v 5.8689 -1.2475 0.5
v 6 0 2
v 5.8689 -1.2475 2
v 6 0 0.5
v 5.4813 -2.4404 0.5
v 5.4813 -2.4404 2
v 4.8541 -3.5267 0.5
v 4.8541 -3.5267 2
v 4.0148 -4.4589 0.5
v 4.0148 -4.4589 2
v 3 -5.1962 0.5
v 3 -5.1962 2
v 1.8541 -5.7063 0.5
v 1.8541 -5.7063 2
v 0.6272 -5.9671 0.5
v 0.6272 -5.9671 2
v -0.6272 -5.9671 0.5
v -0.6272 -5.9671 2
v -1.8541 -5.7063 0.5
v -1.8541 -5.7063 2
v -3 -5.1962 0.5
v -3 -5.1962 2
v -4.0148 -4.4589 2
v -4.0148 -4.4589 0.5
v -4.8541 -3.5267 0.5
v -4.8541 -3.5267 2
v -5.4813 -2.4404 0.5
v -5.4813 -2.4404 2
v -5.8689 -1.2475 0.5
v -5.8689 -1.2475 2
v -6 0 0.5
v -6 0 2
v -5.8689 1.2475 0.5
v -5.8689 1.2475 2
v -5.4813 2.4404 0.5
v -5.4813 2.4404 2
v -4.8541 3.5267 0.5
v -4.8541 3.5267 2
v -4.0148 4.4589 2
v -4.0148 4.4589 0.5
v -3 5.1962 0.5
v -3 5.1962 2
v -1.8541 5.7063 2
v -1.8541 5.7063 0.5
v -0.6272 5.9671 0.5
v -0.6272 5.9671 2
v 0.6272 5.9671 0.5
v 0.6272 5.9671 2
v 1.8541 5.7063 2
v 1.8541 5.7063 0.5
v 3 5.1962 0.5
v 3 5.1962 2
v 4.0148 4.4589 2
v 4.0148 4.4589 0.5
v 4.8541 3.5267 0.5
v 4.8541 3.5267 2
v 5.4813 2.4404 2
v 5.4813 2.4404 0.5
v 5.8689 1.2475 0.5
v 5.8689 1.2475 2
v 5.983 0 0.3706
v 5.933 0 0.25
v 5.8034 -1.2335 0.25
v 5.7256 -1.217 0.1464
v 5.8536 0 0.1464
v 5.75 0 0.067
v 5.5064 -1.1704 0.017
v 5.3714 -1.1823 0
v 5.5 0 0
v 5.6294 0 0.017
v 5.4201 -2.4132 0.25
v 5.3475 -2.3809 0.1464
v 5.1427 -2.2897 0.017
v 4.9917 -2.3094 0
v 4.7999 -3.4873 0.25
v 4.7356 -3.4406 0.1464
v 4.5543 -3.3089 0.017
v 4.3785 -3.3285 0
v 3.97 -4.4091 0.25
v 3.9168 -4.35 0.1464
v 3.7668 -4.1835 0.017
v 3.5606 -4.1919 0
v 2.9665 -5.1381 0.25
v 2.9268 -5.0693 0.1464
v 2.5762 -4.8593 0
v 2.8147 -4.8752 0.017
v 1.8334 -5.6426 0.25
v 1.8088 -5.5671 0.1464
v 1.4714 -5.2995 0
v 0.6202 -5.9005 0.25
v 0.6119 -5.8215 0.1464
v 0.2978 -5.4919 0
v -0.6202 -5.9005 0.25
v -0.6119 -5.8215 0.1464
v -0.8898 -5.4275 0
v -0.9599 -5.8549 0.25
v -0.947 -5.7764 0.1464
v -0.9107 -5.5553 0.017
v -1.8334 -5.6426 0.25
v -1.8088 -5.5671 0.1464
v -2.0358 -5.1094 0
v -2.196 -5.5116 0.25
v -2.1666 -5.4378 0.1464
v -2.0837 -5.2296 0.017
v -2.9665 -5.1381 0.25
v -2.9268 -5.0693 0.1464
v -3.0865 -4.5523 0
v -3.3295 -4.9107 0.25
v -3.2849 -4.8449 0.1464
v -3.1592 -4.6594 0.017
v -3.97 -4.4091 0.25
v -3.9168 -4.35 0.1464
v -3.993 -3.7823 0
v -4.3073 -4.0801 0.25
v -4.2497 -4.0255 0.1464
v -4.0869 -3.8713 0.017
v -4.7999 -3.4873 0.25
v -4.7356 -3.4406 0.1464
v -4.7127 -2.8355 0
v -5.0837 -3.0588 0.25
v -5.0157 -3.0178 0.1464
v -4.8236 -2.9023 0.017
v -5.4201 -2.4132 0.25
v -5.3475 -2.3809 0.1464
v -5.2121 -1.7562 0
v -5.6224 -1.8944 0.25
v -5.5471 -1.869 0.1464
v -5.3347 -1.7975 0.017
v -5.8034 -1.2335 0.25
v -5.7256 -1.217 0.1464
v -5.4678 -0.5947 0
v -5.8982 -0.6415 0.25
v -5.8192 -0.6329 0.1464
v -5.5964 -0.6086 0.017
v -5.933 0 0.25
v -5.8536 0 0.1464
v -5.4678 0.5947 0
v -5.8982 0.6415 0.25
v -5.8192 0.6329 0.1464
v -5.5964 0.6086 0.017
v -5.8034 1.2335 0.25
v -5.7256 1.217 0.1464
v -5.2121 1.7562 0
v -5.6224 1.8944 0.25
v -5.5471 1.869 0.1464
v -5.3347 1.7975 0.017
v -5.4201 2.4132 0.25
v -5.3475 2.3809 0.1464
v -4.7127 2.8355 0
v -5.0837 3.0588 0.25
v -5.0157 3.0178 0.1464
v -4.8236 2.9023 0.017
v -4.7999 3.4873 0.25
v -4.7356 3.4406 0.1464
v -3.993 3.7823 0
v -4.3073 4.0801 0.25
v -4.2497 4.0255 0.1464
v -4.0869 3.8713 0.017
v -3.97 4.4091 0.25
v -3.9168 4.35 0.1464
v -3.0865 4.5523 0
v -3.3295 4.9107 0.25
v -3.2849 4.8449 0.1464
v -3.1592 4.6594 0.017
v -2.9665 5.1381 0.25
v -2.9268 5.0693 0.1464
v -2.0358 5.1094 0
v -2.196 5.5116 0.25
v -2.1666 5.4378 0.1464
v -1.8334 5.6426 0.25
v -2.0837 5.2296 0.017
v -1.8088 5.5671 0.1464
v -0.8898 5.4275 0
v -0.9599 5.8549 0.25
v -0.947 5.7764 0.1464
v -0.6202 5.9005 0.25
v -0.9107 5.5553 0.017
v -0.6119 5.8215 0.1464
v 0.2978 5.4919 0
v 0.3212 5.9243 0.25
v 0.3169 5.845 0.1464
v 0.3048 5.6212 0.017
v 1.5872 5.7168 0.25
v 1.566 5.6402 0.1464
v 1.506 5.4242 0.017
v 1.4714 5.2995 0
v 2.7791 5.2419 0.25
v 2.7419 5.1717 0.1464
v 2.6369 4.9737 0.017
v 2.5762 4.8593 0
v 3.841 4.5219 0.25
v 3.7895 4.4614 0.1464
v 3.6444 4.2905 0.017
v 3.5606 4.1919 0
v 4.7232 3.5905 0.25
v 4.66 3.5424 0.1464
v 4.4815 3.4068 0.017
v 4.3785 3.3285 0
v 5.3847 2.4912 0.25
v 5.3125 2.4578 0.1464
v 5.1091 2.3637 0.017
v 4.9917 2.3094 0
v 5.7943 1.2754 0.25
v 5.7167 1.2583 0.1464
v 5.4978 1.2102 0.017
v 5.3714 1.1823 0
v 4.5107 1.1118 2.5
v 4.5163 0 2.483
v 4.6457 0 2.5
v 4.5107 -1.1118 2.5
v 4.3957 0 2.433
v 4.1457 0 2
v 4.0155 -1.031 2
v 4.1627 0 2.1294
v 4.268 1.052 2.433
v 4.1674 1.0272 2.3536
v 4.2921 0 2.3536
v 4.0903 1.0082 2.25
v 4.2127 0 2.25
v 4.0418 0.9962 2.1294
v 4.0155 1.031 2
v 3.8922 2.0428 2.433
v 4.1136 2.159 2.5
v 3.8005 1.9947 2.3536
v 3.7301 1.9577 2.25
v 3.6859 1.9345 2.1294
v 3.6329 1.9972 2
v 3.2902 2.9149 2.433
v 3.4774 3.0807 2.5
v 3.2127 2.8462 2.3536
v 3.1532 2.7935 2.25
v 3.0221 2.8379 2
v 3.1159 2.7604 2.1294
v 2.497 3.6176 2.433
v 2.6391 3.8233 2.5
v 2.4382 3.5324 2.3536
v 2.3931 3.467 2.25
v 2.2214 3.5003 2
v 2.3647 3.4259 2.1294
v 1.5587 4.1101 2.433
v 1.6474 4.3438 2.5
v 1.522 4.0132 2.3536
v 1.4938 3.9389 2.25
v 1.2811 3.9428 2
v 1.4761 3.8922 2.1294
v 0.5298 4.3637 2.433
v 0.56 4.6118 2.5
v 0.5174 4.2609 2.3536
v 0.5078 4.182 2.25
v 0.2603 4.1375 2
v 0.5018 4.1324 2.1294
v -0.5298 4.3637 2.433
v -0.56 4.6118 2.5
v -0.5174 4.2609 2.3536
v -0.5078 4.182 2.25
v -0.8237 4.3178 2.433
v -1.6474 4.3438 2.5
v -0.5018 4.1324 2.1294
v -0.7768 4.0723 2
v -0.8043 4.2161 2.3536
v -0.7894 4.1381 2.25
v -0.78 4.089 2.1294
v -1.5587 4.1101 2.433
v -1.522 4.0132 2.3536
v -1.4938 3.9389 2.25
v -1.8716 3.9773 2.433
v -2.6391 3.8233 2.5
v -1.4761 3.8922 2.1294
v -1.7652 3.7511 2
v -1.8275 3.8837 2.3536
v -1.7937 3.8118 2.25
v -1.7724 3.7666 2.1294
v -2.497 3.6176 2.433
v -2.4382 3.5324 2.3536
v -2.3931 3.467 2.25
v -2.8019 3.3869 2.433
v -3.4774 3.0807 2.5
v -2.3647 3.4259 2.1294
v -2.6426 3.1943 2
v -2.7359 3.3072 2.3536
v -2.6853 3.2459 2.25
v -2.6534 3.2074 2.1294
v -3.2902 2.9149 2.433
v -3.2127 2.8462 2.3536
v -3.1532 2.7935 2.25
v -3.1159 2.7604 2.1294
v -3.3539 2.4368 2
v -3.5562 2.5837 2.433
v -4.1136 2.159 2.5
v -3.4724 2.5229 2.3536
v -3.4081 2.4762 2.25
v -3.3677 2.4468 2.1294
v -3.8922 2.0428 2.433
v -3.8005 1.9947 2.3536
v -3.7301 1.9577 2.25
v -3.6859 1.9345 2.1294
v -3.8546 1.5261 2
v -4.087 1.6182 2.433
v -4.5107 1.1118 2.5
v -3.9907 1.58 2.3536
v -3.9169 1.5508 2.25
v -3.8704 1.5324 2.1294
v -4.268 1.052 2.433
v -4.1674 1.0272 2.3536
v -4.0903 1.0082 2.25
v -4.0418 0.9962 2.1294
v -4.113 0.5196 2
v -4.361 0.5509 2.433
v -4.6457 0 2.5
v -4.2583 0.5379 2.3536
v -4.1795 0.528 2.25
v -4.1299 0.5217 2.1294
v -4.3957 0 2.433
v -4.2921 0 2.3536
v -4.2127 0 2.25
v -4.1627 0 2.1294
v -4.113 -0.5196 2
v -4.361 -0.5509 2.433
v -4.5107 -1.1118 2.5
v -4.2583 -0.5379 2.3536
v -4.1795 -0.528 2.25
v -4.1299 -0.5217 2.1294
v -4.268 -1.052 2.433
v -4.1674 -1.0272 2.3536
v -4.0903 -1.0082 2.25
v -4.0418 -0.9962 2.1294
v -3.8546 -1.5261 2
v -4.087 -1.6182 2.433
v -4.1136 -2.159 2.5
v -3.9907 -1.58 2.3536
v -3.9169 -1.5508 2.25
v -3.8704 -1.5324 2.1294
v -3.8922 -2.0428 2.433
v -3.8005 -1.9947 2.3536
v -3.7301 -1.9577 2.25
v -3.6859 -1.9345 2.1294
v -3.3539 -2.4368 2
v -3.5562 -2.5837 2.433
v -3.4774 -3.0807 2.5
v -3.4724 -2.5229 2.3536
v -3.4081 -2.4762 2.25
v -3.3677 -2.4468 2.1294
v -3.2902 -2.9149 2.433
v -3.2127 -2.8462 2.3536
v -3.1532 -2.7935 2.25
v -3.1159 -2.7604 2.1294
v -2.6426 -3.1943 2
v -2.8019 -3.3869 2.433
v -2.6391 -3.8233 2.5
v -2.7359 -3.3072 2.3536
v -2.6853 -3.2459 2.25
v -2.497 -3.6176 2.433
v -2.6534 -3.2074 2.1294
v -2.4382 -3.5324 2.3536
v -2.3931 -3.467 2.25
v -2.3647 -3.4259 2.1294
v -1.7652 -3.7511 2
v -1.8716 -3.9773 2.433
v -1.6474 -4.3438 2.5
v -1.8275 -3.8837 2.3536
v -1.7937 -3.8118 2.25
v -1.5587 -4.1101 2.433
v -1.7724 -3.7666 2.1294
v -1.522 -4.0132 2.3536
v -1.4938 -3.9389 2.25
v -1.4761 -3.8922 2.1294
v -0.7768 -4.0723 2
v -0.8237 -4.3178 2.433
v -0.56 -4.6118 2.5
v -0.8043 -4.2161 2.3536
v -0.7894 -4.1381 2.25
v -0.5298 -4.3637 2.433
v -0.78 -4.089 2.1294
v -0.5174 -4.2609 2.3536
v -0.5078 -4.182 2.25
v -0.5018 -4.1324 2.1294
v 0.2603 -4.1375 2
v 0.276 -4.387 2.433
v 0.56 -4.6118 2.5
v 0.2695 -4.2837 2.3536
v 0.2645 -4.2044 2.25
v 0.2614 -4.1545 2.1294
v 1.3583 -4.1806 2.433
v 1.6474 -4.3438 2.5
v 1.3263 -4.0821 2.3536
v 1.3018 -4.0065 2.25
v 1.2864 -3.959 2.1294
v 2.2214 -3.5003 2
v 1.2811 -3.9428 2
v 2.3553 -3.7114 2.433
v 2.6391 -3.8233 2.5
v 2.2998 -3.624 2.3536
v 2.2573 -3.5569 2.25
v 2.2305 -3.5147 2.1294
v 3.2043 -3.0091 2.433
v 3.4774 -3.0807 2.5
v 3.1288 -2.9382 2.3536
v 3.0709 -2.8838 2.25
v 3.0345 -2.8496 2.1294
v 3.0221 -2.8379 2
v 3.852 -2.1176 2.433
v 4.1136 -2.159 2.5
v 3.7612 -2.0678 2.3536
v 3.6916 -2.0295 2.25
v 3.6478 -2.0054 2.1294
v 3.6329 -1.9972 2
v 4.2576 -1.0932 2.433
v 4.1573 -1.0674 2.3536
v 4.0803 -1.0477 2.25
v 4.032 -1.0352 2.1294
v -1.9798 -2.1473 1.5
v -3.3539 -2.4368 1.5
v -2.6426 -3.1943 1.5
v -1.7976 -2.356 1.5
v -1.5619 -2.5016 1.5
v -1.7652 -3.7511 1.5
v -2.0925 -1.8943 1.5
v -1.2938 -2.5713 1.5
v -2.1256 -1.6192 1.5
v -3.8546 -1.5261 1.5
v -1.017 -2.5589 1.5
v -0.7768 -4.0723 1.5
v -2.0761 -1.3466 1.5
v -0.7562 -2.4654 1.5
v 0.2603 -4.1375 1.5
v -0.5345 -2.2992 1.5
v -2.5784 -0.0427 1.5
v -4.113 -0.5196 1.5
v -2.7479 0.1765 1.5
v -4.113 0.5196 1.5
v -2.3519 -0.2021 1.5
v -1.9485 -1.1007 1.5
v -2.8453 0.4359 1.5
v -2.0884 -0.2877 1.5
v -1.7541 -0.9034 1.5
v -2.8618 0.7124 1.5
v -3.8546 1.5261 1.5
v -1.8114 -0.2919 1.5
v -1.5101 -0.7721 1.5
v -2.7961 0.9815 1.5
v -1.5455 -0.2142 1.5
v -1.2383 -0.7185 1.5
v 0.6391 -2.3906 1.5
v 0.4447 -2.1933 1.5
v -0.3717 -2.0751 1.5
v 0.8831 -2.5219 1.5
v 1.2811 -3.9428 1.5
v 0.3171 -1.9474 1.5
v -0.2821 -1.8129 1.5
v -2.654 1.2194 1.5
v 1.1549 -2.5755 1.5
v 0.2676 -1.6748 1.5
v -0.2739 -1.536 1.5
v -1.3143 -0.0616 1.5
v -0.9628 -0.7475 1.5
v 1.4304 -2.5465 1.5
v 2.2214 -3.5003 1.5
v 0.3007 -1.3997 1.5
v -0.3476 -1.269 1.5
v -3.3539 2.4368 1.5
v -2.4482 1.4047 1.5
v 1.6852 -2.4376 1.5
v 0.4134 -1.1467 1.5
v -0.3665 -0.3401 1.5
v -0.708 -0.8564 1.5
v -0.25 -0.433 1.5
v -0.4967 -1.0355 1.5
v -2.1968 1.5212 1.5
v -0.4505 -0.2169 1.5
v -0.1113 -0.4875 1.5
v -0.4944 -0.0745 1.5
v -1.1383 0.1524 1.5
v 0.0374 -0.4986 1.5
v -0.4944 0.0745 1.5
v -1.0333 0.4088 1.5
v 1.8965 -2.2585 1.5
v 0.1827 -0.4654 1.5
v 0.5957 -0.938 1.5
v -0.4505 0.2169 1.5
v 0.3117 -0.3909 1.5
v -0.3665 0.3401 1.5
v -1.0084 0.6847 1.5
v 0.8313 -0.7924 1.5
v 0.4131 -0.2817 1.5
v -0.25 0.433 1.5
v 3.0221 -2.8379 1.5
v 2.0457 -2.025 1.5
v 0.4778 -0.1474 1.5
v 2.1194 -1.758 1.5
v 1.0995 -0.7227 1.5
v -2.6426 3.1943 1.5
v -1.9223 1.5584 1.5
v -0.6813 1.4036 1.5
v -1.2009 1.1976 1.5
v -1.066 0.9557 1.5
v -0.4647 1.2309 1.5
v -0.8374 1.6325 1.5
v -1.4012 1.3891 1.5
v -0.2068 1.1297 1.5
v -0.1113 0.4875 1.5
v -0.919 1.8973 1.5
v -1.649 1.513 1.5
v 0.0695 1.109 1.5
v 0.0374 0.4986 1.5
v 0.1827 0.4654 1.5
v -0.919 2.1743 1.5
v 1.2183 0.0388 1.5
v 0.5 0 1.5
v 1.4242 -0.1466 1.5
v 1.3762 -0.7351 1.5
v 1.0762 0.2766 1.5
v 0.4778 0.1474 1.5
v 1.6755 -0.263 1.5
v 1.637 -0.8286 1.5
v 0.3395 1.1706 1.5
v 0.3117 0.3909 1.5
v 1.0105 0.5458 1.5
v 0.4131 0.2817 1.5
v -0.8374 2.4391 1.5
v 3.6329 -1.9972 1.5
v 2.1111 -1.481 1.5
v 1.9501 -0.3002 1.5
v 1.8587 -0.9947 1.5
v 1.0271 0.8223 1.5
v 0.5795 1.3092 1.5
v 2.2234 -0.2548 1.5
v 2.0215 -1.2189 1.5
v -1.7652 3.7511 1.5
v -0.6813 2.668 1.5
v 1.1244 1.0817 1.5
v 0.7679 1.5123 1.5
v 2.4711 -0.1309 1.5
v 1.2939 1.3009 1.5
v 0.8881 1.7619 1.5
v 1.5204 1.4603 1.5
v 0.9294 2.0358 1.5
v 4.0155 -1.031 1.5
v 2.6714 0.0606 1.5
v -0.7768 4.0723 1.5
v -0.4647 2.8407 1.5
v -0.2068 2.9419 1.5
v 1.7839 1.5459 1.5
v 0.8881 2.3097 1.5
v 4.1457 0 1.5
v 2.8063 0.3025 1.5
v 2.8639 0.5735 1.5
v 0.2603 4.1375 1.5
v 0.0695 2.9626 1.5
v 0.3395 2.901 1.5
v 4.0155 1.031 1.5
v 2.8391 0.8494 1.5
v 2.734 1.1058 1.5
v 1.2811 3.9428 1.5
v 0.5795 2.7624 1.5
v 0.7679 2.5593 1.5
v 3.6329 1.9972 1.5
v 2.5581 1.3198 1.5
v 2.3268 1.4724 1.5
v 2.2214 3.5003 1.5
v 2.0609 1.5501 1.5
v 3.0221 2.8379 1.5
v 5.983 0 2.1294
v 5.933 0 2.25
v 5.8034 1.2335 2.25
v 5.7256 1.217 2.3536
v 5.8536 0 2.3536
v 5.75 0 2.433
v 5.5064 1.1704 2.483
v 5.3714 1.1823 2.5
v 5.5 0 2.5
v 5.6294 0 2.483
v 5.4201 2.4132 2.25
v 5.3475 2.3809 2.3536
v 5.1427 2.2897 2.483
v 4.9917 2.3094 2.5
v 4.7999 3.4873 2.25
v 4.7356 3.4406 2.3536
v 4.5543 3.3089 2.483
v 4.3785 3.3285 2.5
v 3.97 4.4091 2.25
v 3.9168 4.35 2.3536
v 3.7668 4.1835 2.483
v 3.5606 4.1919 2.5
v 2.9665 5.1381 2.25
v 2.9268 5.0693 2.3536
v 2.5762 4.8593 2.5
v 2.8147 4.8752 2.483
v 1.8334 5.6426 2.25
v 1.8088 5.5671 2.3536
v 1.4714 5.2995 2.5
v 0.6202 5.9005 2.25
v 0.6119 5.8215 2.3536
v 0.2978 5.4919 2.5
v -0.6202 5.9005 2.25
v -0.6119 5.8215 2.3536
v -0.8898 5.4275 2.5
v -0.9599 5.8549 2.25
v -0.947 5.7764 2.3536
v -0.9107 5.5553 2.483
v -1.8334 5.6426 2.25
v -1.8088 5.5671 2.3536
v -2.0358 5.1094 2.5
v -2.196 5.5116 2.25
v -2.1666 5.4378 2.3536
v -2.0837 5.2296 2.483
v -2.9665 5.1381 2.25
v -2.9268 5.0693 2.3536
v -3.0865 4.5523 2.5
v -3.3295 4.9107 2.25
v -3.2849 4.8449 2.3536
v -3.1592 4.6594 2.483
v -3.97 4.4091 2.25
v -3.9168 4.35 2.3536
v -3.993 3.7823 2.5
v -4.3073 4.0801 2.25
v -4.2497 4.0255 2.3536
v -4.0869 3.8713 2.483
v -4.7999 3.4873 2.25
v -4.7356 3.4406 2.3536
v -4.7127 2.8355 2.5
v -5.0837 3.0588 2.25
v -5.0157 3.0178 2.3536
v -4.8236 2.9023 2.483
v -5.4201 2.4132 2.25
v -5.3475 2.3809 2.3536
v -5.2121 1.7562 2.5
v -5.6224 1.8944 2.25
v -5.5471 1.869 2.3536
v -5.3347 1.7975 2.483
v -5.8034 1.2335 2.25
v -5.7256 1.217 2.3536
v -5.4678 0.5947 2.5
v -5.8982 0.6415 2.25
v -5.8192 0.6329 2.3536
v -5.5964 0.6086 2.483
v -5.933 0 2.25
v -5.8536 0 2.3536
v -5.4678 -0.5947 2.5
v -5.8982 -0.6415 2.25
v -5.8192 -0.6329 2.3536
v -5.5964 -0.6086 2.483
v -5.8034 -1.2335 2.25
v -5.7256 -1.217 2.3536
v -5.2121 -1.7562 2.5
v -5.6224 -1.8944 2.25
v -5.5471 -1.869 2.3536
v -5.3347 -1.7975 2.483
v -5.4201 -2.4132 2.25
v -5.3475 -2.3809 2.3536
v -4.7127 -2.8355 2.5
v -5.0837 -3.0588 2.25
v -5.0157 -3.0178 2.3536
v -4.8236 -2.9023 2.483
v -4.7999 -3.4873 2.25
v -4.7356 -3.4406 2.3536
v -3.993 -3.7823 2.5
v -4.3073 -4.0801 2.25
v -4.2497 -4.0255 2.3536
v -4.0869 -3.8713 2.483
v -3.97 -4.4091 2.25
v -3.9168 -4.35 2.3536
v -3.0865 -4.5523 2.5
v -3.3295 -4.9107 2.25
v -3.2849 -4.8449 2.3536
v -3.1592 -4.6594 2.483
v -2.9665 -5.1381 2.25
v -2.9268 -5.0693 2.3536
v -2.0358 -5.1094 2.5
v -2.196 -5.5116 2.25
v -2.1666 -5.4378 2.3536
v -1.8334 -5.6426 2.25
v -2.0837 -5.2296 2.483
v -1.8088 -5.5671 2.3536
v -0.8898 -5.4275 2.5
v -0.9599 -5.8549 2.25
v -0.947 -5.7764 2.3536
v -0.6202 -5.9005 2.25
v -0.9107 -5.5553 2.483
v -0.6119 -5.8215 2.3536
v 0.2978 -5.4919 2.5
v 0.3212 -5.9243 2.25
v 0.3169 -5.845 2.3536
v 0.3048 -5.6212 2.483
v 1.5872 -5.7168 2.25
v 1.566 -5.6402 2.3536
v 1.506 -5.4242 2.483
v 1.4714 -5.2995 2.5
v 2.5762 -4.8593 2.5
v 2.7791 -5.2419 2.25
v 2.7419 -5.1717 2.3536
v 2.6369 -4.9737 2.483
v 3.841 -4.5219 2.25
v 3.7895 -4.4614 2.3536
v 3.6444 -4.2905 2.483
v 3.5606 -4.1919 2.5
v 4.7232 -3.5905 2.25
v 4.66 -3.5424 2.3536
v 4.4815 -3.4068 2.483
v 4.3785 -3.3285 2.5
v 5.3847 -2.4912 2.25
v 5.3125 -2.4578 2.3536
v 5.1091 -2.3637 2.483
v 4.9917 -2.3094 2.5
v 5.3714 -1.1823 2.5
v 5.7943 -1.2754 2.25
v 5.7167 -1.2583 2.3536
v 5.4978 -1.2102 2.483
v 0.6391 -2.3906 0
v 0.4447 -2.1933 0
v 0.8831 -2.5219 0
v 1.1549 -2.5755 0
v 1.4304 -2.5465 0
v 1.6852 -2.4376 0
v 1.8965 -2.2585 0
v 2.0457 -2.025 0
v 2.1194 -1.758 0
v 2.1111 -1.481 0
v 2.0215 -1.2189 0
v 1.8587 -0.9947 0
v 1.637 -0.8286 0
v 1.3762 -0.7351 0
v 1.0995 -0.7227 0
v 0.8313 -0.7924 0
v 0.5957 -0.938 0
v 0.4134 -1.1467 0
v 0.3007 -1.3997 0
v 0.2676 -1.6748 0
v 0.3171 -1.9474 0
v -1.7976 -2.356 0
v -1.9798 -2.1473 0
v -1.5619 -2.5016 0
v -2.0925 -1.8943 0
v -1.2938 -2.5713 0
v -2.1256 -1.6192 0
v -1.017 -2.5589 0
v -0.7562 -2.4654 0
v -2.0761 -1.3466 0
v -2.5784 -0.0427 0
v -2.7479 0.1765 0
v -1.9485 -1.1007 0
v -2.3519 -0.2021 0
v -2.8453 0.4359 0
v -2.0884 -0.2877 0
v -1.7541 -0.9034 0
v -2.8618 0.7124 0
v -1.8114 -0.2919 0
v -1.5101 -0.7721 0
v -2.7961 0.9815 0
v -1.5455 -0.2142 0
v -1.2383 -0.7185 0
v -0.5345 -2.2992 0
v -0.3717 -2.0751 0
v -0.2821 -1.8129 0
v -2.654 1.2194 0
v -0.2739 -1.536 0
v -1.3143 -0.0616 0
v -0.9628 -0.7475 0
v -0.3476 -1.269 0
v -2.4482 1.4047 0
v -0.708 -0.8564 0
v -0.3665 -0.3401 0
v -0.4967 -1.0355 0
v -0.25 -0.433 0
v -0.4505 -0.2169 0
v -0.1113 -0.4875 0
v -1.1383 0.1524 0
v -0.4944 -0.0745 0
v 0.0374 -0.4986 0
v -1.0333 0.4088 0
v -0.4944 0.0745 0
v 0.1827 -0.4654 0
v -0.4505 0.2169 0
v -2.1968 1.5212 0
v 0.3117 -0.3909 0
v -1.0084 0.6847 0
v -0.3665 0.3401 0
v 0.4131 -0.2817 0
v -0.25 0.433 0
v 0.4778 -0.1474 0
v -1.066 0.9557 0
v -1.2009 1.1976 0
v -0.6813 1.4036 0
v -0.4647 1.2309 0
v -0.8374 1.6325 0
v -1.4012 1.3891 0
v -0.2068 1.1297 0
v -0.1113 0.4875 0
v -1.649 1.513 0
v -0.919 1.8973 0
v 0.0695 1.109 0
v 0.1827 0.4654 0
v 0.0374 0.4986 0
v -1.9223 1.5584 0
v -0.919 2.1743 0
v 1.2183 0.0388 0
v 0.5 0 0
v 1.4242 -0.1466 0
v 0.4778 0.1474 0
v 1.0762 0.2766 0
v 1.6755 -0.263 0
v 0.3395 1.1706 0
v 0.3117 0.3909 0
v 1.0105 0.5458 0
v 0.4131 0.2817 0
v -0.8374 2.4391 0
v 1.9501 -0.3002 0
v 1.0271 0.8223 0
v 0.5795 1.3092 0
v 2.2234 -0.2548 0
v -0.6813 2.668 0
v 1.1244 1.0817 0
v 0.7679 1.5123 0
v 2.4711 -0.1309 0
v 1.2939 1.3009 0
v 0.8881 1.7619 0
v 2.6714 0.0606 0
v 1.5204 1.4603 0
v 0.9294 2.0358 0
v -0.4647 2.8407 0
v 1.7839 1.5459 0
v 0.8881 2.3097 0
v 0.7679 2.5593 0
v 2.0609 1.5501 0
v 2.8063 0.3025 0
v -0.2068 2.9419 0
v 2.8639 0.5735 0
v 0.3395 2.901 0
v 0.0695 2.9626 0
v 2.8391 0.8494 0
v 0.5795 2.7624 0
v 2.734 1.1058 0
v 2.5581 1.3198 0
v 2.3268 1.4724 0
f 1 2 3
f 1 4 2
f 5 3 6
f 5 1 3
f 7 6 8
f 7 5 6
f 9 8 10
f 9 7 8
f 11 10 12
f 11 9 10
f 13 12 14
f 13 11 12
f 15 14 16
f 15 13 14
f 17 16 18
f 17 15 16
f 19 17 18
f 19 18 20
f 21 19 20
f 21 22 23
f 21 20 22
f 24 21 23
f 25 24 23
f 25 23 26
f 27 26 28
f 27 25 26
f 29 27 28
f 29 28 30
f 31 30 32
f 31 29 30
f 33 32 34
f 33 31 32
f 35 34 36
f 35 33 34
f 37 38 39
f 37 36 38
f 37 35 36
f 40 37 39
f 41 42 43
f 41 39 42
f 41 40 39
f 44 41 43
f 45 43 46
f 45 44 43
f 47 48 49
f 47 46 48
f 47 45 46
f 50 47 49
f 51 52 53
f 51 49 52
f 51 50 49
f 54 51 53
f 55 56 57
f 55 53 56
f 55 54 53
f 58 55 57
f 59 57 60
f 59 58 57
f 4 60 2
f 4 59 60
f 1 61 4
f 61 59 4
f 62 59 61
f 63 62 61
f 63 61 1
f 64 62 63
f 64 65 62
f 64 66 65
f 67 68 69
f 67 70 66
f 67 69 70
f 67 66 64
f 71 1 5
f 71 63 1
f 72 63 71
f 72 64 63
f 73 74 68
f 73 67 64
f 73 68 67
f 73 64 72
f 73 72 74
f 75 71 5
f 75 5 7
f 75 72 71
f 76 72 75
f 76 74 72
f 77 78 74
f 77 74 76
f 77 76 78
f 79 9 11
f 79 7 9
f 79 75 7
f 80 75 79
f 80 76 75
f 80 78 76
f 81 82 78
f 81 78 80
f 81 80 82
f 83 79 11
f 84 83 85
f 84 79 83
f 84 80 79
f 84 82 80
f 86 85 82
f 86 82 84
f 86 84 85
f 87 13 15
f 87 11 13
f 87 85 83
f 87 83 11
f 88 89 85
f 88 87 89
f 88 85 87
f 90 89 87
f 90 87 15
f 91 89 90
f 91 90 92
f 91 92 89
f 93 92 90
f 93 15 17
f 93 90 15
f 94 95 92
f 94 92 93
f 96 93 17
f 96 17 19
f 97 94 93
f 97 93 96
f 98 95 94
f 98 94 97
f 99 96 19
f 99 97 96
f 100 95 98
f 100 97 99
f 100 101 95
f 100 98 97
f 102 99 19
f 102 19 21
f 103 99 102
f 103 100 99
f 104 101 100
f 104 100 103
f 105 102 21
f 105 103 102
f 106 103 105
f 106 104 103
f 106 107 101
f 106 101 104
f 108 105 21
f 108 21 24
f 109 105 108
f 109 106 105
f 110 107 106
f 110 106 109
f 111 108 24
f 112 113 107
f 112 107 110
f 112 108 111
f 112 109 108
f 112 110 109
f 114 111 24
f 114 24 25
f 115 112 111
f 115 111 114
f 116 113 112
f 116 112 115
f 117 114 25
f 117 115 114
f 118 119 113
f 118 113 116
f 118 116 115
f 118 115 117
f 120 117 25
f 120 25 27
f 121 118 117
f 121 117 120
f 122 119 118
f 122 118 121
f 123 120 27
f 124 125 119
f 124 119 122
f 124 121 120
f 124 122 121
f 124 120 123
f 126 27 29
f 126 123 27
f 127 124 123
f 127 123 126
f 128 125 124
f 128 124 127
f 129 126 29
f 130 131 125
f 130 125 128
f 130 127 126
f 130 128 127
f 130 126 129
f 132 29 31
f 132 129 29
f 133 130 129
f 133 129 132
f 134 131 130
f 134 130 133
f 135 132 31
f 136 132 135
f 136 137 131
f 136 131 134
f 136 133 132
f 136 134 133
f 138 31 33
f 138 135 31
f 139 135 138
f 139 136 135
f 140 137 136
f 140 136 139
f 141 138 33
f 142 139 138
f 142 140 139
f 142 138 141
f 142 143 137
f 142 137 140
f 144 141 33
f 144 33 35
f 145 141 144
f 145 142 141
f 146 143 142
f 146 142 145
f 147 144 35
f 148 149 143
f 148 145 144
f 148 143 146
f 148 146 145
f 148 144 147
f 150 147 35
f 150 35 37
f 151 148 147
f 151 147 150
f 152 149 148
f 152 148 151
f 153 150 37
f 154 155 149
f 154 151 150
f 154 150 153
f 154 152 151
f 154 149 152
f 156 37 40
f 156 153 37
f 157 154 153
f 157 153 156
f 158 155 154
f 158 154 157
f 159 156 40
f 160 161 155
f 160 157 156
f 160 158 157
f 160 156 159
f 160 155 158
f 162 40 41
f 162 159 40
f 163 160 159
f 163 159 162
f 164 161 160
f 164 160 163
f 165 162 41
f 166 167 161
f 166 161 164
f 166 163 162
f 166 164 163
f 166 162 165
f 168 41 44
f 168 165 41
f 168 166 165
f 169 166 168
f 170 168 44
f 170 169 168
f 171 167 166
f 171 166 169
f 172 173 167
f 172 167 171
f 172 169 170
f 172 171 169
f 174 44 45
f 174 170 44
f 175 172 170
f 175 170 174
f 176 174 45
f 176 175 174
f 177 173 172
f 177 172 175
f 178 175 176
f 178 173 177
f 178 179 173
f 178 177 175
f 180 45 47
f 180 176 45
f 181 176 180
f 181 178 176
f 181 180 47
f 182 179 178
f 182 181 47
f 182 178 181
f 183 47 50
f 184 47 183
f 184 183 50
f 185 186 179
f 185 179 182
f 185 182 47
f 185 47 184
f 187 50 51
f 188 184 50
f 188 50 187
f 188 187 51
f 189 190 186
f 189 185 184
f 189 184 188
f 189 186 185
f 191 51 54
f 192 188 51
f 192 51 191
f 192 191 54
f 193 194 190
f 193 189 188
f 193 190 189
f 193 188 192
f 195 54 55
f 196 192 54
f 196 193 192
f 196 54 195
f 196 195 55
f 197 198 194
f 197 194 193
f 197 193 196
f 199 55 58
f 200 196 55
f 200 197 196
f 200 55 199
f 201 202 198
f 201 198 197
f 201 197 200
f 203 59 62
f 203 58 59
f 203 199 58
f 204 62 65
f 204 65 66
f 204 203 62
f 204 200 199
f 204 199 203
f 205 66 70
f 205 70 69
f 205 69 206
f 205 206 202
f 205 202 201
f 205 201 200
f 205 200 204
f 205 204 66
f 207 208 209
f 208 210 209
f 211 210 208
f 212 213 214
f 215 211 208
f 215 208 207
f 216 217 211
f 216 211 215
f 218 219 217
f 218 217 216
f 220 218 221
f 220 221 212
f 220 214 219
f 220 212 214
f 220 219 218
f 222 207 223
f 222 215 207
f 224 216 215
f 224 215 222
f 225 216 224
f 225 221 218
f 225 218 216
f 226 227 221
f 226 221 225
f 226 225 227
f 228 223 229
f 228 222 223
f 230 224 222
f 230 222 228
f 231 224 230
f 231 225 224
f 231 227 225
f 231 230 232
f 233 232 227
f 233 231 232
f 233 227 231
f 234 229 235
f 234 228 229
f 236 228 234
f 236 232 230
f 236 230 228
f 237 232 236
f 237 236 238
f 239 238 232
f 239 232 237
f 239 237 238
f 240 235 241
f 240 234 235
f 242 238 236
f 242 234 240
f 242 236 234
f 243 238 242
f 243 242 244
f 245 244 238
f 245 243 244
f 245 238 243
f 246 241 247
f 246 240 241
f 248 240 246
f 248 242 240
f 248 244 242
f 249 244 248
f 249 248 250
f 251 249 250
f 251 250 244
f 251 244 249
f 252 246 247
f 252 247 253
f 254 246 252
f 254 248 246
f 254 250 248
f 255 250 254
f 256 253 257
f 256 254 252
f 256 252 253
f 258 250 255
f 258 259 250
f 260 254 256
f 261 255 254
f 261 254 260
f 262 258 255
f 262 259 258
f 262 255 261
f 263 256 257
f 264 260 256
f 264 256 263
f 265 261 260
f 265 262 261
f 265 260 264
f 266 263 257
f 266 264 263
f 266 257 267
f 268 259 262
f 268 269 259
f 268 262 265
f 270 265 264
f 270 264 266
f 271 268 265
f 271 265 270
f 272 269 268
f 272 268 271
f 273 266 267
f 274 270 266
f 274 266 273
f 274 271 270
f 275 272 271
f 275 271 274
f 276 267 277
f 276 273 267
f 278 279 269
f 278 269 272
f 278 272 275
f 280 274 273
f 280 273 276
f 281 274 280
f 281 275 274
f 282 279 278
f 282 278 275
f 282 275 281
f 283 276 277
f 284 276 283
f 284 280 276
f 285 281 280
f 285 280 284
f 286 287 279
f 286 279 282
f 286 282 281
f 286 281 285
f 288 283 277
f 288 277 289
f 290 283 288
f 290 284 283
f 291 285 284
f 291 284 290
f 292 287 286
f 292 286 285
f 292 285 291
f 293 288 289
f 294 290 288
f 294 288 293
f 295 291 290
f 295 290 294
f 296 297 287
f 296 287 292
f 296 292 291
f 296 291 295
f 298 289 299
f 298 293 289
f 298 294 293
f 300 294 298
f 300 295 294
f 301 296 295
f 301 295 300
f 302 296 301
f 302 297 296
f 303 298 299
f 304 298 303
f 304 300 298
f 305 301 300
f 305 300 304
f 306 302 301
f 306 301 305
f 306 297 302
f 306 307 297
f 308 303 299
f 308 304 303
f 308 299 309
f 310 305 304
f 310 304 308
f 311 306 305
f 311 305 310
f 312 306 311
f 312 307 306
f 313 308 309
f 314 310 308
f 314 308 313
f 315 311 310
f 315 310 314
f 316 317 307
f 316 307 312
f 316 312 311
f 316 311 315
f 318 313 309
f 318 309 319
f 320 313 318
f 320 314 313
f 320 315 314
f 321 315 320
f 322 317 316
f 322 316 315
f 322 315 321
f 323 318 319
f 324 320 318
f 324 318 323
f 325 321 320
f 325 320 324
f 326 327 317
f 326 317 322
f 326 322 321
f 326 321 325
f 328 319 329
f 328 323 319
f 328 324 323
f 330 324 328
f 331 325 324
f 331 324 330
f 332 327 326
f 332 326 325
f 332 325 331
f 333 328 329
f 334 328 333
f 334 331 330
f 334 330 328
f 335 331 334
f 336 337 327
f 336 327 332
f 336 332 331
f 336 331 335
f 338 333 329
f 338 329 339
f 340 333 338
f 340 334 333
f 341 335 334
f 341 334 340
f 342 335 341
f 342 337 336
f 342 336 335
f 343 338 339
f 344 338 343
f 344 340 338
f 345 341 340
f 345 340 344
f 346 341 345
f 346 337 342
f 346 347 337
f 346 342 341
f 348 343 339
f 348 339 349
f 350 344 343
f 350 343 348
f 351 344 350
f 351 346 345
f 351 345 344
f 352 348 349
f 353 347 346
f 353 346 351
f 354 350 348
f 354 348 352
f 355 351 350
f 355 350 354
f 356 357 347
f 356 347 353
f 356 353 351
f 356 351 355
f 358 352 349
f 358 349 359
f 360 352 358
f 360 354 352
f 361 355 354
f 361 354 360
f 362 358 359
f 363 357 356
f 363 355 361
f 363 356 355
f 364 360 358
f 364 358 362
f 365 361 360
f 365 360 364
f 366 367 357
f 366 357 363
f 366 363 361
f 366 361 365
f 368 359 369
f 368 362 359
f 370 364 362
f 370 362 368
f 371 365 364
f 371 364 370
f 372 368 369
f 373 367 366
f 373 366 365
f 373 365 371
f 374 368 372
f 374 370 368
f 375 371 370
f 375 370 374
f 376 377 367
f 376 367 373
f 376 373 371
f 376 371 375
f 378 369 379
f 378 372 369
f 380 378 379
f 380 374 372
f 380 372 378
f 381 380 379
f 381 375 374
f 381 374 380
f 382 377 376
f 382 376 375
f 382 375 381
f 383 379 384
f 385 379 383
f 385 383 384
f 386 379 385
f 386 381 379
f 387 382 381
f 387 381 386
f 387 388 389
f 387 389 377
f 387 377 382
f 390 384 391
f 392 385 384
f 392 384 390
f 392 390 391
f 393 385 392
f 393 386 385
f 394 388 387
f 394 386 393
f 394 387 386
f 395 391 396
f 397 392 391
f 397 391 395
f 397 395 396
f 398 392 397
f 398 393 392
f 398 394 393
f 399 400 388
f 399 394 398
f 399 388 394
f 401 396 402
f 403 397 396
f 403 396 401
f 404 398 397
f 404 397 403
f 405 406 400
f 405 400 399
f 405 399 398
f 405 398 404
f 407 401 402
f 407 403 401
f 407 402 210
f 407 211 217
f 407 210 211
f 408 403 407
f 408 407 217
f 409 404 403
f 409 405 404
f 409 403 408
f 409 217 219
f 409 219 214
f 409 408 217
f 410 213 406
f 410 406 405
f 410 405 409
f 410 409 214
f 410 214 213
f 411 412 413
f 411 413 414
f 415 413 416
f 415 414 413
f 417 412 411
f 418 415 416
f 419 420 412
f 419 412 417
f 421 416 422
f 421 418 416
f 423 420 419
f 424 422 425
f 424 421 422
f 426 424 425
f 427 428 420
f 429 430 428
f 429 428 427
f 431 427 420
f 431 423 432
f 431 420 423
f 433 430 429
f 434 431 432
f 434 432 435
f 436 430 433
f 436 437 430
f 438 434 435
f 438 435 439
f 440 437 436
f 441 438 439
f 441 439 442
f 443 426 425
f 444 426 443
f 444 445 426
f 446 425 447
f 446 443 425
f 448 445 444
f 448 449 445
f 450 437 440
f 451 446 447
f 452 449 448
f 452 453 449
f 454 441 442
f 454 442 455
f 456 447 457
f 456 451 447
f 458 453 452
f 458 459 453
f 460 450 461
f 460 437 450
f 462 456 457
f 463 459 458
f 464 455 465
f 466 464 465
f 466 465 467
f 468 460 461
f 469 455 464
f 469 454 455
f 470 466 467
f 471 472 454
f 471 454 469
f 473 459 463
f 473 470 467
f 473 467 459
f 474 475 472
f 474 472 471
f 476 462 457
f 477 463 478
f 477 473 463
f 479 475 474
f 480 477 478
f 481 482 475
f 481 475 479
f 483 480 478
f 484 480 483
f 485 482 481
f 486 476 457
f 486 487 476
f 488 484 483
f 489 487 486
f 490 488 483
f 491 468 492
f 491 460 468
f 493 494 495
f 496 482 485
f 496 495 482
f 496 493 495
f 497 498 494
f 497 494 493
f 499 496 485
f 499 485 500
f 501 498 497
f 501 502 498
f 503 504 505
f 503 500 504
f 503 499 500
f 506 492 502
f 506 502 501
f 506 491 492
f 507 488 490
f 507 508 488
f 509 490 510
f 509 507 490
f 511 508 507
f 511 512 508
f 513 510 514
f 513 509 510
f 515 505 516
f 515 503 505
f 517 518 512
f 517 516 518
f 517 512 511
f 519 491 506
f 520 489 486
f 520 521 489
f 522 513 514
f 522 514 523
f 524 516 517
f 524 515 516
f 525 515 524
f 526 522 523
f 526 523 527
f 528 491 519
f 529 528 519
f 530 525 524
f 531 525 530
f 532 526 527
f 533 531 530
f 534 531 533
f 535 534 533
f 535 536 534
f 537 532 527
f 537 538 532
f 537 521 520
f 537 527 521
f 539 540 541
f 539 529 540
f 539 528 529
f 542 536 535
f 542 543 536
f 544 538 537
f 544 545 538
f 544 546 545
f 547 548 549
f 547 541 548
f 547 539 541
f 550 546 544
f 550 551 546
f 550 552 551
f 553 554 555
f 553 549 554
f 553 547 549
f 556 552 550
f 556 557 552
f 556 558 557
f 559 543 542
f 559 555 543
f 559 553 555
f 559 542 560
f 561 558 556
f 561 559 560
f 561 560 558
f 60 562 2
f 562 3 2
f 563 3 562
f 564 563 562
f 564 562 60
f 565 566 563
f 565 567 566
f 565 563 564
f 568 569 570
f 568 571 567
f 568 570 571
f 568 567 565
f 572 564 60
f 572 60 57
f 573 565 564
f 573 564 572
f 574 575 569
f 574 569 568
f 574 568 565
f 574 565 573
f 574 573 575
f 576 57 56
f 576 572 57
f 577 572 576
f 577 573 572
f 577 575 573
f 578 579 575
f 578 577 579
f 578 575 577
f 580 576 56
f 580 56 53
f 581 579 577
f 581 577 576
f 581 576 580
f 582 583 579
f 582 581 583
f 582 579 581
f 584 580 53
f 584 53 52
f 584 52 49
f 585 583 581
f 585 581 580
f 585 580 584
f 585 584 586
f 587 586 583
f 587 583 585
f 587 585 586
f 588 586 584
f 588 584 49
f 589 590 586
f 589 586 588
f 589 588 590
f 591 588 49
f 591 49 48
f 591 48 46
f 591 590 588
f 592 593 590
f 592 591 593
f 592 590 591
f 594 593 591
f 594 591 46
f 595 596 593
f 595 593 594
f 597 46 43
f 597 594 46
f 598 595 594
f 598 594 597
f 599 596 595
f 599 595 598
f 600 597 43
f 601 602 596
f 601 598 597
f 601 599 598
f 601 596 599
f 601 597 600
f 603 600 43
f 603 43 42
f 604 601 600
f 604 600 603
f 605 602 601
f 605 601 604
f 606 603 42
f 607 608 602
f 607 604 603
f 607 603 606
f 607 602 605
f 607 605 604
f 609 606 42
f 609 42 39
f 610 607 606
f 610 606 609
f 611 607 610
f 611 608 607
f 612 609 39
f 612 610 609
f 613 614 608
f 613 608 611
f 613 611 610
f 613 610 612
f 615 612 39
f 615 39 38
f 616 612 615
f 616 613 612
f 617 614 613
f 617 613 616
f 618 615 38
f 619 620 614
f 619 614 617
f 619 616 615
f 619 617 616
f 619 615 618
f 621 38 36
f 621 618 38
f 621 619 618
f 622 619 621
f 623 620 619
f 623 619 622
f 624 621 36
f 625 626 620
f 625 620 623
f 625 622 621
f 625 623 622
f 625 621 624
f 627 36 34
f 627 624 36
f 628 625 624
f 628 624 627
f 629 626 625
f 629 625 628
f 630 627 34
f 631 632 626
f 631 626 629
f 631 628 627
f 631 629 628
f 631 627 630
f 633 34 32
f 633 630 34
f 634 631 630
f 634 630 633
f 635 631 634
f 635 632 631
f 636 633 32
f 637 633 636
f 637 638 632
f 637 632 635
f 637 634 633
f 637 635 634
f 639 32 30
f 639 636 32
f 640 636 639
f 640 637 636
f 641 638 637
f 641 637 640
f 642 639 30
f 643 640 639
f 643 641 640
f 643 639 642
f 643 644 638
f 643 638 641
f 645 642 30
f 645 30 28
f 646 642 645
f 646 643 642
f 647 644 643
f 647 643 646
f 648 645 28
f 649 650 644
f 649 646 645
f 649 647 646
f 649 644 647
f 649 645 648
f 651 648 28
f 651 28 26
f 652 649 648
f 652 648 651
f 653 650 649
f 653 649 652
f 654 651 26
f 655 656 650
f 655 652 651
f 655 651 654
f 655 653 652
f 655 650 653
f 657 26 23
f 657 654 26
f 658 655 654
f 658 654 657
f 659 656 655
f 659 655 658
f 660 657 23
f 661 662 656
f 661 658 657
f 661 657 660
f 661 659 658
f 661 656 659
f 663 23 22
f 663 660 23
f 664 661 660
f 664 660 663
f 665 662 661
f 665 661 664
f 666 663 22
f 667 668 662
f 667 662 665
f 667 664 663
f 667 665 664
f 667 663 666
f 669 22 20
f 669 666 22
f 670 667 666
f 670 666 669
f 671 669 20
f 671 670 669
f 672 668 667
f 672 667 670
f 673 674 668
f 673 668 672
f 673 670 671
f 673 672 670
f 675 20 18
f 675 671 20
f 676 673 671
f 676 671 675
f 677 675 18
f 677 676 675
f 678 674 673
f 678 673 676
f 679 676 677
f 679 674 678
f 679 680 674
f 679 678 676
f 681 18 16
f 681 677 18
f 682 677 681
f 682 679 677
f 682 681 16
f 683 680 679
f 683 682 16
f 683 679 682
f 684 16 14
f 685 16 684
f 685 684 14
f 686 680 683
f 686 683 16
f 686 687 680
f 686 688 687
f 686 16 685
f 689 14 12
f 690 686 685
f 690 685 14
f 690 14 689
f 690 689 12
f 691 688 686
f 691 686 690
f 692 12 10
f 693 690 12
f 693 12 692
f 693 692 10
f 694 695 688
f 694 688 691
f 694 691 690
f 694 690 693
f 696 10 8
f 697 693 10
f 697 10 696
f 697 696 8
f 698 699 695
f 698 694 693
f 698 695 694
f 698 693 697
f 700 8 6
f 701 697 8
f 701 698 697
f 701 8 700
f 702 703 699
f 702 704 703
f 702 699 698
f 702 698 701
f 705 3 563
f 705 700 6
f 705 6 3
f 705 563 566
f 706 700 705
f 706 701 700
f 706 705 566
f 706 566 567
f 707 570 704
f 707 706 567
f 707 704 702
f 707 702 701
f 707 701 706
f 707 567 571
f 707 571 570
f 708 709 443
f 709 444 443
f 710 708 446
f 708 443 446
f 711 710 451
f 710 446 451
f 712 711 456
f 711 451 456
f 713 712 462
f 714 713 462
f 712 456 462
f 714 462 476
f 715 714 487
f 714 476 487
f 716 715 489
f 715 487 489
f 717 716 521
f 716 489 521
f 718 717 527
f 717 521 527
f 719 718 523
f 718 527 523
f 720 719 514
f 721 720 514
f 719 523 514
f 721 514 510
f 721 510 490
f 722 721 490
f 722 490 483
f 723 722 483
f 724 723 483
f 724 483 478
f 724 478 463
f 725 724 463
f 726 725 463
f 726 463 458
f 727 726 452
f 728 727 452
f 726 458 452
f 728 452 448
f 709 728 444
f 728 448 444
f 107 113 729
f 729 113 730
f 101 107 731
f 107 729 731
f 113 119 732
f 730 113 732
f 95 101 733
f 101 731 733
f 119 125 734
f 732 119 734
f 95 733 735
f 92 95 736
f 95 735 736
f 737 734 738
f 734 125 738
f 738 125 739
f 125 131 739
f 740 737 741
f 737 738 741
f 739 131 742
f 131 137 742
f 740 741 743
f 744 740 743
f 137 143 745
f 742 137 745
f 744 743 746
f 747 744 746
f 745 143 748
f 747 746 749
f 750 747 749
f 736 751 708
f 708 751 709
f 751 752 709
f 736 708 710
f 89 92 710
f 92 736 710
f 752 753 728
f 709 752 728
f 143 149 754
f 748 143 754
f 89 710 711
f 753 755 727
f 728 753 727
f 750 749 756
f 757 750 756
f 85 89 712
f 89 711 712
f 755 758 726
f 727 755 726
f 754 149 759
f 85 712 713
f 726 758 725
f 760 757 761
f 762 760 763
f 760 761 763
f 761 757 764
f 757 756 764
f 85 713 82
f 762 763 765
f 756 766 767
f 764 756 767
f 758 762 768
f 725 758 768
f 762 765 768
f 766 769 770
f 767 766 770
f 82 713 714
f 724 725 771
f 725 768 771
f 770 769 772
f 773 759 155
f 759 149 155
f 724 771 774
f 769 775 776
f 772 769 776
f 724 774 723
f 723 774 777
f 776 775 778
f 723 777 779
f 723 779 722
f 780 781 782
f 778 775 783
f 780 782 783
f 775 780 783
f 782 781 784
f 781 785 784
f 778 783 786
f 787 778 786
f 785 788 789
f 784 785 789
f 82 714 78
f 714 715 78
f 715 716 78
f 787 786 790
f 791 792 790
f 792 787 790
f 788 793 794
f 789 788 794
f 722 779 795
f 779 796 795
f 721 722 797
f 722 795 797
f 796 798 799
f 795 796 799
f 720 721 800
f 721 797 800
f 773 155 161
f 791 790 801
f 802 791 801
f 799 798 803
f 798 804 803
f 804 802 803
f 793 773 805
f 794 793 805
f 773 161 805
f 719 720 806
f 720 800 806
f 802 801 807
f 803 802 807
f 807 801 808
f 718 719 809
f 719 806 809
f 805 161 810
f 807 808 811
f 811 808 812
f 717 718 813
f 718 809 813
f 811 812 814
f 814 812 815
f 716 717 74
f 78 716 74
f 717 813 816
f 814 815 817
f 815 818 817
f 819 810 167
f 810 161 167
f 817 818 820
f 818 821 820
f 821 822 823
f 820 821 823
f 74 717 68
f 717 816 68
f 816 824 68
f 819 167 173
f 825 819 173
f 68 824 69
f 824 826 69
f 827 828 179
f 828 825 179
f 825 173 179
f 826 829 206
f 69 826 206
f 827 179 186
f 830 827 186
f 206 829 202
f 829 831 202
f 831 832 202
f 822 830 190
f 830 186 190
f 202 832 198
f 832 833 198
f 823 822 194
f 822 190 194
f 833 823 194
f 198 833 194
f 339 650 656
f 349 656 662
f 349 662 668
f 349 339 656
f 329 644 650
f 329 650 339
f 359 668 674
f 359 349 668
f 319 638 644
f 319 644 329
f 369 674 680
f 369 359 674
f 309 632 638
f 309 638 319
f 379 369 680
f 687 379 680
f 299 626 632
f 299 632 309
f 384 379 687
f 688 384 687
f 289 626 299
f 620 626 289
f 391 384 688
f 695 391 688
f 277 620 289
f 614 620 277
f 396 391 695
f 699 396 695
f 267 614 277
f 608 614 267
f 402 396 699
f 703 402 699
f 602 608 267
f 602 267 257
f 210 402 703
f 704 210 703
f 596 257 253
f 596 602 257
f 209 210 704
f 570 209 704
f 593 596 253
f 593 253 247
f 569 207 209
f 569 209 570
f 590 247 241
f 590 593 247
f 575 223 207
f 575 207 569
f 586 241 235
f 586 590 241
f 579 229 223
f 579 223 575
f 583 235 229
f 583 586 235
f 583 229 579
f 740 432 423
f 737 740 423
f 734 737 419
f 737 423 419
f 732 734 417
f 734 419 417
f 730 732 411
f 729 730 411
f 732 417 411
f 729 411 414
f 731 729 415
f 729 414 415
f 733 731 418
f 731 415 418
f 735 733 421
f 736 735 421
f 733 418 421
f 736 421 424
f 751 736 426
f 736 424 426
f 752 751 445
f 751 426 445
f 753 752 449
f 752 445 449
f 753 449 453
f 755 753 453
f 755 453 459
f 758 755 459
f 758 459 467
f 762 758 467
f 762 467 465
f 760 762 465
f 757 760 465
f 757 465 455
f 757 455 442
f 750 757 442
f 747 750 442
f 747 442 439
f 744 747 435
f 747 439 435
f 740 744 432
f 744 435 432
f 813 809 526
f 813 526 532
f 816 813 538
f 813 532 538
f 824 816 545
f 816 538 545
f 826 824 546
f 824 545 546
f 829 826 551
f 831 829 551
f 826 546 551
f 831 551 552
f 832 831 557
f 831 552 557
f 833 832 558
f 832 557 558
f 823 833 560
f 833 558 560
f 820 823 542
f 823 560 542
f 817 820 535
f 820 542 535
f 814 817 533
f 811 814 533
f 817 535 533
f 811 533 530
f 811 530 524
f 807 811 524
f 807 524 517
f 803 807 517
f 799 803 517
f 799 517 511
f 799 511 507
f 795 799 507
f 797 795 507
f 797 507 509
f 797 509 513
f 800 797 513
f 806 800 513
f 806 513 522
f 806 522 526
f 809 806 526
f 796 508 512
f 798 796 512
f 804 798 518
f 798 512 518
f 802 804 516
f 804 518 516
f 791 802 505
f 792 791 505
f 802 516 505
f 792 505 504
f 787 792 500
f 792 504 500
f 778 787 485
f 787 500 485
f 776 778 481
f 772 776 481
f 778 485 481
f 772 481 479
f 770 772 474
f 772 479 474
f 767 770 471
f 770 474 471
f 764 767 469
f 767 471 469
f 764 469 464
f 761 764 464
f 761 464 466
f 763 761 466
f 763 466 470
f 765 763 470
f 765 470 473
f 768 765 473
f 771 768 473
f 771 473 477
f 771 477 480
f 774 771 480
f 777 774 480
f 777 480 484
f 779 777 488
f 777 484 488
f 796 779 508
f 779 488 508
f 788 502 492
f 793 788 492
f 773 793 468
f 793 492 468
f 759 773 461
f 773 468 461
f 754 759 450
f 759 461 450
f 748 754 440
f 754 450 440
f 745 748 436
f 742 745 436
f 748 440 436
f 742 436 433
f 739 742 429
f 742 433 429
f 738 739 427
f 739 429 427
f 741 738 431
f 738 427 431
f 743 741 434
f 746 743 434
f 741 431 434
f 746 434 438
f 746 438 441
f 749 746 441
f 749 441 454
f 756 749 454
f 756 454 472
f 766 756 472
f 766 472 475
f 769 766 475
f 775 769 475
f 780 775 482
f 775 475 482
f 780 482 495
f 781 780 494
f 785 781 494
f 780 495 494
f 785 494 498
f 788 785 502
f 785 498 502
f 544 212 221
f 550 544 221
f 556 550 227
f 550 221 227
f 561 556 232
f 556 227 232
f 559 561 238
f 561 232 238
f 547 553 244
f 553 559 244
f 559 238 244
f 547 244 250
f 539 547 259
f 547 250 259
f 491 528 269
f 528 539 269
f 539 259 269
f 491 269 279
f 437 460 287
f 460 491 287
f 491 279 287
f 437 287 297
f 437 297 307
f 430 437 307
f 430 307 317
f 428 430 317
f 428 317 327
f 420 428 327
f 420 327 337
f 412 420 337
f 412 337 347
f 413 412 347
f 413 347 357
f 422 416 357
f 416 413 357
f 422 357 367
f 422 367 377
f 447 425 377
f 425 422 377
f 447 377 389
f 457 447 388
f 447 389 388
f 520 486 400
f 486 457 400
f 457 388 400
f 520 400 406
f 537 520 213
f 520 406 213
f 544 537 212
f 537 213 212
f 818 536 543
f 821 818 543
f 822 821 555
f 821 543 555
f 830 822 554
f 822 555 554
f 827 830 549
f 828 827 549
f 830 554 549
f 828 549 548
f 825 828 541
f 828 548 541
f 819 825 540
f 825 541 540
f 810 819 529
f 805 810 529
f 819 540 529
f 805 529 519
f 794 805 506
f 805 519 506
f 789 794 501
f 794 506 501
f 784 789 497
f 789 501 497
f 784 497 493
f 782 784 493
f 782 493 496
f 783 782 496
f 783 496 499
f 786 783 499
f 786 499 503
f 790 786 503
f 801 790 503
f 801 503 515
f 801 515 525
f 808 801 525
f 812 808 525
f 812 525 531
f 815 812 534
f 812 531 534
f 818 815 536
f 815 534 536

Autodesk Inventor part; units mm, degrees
ref_plane "YZ Plane" through (0, 0, 0) normal (1, 0, 0) x (0, 1, 0)
ref_plane "XZ Plane" through (0, 0, 0) normal (0, 1, 0) x (-1, 0, 0)
ref_plane "XY Plane" through (0, 0, 0) normal (0, 0, 1) x (1, 0, 0)
sketch "Sketch1" plane through (0, 0, 0) normal (0, 0, 1) x (1, 0, 0)
  circle A0 centre (0, 0) radius 6
  dimension "d0" = 12
extrude "Extrusion1" add sketch "Sketch1" along normal blind 2.5
fillet "Fillet1" radius 0.5 2 edges at (-6, 0, 2.5) (-6, 0, 0)
sketch "Sketch2" plane through (0, 0, 2.5) normal (0, 0, 1) x (1, 0, 0)
  circle A0 centre (0, 0) radius 4.1457
extrude "Extrusion2" cut sketch "Sketch2" against normal blind 1
fillet "Fillet2" radius 0.5 1 edges at (-4.1457, 0, 2.5)
sketch "Sketch3" plane through (0, 0, 1.5) normal (0, 0, 1) x (1, 0, 0)
  circle A0 centre (0, 0) radius 0.5
  dimension "d7" = 1
extrude "Extrusion3" cut sketch "Sketch3" against normal through all
sketch "Sketch4" plane through (0, 0, 1.5) normal (0, 0, 1) x (1, 0, 0)
  circle A0 centre (0, 2.0358) radius 0.9294
  point P0 (0, 0)
extrude "Extrusion4" cut sketch "Sketch4" against normal blind 1.5
pattern_circular "Circular Pattern1" count 5 over 360 about axis through (0, 0, 1.5) along (0, 0, -1) of "Extrusion2", "Extrusion4"
properties part number "Wheel IT_CPY"
